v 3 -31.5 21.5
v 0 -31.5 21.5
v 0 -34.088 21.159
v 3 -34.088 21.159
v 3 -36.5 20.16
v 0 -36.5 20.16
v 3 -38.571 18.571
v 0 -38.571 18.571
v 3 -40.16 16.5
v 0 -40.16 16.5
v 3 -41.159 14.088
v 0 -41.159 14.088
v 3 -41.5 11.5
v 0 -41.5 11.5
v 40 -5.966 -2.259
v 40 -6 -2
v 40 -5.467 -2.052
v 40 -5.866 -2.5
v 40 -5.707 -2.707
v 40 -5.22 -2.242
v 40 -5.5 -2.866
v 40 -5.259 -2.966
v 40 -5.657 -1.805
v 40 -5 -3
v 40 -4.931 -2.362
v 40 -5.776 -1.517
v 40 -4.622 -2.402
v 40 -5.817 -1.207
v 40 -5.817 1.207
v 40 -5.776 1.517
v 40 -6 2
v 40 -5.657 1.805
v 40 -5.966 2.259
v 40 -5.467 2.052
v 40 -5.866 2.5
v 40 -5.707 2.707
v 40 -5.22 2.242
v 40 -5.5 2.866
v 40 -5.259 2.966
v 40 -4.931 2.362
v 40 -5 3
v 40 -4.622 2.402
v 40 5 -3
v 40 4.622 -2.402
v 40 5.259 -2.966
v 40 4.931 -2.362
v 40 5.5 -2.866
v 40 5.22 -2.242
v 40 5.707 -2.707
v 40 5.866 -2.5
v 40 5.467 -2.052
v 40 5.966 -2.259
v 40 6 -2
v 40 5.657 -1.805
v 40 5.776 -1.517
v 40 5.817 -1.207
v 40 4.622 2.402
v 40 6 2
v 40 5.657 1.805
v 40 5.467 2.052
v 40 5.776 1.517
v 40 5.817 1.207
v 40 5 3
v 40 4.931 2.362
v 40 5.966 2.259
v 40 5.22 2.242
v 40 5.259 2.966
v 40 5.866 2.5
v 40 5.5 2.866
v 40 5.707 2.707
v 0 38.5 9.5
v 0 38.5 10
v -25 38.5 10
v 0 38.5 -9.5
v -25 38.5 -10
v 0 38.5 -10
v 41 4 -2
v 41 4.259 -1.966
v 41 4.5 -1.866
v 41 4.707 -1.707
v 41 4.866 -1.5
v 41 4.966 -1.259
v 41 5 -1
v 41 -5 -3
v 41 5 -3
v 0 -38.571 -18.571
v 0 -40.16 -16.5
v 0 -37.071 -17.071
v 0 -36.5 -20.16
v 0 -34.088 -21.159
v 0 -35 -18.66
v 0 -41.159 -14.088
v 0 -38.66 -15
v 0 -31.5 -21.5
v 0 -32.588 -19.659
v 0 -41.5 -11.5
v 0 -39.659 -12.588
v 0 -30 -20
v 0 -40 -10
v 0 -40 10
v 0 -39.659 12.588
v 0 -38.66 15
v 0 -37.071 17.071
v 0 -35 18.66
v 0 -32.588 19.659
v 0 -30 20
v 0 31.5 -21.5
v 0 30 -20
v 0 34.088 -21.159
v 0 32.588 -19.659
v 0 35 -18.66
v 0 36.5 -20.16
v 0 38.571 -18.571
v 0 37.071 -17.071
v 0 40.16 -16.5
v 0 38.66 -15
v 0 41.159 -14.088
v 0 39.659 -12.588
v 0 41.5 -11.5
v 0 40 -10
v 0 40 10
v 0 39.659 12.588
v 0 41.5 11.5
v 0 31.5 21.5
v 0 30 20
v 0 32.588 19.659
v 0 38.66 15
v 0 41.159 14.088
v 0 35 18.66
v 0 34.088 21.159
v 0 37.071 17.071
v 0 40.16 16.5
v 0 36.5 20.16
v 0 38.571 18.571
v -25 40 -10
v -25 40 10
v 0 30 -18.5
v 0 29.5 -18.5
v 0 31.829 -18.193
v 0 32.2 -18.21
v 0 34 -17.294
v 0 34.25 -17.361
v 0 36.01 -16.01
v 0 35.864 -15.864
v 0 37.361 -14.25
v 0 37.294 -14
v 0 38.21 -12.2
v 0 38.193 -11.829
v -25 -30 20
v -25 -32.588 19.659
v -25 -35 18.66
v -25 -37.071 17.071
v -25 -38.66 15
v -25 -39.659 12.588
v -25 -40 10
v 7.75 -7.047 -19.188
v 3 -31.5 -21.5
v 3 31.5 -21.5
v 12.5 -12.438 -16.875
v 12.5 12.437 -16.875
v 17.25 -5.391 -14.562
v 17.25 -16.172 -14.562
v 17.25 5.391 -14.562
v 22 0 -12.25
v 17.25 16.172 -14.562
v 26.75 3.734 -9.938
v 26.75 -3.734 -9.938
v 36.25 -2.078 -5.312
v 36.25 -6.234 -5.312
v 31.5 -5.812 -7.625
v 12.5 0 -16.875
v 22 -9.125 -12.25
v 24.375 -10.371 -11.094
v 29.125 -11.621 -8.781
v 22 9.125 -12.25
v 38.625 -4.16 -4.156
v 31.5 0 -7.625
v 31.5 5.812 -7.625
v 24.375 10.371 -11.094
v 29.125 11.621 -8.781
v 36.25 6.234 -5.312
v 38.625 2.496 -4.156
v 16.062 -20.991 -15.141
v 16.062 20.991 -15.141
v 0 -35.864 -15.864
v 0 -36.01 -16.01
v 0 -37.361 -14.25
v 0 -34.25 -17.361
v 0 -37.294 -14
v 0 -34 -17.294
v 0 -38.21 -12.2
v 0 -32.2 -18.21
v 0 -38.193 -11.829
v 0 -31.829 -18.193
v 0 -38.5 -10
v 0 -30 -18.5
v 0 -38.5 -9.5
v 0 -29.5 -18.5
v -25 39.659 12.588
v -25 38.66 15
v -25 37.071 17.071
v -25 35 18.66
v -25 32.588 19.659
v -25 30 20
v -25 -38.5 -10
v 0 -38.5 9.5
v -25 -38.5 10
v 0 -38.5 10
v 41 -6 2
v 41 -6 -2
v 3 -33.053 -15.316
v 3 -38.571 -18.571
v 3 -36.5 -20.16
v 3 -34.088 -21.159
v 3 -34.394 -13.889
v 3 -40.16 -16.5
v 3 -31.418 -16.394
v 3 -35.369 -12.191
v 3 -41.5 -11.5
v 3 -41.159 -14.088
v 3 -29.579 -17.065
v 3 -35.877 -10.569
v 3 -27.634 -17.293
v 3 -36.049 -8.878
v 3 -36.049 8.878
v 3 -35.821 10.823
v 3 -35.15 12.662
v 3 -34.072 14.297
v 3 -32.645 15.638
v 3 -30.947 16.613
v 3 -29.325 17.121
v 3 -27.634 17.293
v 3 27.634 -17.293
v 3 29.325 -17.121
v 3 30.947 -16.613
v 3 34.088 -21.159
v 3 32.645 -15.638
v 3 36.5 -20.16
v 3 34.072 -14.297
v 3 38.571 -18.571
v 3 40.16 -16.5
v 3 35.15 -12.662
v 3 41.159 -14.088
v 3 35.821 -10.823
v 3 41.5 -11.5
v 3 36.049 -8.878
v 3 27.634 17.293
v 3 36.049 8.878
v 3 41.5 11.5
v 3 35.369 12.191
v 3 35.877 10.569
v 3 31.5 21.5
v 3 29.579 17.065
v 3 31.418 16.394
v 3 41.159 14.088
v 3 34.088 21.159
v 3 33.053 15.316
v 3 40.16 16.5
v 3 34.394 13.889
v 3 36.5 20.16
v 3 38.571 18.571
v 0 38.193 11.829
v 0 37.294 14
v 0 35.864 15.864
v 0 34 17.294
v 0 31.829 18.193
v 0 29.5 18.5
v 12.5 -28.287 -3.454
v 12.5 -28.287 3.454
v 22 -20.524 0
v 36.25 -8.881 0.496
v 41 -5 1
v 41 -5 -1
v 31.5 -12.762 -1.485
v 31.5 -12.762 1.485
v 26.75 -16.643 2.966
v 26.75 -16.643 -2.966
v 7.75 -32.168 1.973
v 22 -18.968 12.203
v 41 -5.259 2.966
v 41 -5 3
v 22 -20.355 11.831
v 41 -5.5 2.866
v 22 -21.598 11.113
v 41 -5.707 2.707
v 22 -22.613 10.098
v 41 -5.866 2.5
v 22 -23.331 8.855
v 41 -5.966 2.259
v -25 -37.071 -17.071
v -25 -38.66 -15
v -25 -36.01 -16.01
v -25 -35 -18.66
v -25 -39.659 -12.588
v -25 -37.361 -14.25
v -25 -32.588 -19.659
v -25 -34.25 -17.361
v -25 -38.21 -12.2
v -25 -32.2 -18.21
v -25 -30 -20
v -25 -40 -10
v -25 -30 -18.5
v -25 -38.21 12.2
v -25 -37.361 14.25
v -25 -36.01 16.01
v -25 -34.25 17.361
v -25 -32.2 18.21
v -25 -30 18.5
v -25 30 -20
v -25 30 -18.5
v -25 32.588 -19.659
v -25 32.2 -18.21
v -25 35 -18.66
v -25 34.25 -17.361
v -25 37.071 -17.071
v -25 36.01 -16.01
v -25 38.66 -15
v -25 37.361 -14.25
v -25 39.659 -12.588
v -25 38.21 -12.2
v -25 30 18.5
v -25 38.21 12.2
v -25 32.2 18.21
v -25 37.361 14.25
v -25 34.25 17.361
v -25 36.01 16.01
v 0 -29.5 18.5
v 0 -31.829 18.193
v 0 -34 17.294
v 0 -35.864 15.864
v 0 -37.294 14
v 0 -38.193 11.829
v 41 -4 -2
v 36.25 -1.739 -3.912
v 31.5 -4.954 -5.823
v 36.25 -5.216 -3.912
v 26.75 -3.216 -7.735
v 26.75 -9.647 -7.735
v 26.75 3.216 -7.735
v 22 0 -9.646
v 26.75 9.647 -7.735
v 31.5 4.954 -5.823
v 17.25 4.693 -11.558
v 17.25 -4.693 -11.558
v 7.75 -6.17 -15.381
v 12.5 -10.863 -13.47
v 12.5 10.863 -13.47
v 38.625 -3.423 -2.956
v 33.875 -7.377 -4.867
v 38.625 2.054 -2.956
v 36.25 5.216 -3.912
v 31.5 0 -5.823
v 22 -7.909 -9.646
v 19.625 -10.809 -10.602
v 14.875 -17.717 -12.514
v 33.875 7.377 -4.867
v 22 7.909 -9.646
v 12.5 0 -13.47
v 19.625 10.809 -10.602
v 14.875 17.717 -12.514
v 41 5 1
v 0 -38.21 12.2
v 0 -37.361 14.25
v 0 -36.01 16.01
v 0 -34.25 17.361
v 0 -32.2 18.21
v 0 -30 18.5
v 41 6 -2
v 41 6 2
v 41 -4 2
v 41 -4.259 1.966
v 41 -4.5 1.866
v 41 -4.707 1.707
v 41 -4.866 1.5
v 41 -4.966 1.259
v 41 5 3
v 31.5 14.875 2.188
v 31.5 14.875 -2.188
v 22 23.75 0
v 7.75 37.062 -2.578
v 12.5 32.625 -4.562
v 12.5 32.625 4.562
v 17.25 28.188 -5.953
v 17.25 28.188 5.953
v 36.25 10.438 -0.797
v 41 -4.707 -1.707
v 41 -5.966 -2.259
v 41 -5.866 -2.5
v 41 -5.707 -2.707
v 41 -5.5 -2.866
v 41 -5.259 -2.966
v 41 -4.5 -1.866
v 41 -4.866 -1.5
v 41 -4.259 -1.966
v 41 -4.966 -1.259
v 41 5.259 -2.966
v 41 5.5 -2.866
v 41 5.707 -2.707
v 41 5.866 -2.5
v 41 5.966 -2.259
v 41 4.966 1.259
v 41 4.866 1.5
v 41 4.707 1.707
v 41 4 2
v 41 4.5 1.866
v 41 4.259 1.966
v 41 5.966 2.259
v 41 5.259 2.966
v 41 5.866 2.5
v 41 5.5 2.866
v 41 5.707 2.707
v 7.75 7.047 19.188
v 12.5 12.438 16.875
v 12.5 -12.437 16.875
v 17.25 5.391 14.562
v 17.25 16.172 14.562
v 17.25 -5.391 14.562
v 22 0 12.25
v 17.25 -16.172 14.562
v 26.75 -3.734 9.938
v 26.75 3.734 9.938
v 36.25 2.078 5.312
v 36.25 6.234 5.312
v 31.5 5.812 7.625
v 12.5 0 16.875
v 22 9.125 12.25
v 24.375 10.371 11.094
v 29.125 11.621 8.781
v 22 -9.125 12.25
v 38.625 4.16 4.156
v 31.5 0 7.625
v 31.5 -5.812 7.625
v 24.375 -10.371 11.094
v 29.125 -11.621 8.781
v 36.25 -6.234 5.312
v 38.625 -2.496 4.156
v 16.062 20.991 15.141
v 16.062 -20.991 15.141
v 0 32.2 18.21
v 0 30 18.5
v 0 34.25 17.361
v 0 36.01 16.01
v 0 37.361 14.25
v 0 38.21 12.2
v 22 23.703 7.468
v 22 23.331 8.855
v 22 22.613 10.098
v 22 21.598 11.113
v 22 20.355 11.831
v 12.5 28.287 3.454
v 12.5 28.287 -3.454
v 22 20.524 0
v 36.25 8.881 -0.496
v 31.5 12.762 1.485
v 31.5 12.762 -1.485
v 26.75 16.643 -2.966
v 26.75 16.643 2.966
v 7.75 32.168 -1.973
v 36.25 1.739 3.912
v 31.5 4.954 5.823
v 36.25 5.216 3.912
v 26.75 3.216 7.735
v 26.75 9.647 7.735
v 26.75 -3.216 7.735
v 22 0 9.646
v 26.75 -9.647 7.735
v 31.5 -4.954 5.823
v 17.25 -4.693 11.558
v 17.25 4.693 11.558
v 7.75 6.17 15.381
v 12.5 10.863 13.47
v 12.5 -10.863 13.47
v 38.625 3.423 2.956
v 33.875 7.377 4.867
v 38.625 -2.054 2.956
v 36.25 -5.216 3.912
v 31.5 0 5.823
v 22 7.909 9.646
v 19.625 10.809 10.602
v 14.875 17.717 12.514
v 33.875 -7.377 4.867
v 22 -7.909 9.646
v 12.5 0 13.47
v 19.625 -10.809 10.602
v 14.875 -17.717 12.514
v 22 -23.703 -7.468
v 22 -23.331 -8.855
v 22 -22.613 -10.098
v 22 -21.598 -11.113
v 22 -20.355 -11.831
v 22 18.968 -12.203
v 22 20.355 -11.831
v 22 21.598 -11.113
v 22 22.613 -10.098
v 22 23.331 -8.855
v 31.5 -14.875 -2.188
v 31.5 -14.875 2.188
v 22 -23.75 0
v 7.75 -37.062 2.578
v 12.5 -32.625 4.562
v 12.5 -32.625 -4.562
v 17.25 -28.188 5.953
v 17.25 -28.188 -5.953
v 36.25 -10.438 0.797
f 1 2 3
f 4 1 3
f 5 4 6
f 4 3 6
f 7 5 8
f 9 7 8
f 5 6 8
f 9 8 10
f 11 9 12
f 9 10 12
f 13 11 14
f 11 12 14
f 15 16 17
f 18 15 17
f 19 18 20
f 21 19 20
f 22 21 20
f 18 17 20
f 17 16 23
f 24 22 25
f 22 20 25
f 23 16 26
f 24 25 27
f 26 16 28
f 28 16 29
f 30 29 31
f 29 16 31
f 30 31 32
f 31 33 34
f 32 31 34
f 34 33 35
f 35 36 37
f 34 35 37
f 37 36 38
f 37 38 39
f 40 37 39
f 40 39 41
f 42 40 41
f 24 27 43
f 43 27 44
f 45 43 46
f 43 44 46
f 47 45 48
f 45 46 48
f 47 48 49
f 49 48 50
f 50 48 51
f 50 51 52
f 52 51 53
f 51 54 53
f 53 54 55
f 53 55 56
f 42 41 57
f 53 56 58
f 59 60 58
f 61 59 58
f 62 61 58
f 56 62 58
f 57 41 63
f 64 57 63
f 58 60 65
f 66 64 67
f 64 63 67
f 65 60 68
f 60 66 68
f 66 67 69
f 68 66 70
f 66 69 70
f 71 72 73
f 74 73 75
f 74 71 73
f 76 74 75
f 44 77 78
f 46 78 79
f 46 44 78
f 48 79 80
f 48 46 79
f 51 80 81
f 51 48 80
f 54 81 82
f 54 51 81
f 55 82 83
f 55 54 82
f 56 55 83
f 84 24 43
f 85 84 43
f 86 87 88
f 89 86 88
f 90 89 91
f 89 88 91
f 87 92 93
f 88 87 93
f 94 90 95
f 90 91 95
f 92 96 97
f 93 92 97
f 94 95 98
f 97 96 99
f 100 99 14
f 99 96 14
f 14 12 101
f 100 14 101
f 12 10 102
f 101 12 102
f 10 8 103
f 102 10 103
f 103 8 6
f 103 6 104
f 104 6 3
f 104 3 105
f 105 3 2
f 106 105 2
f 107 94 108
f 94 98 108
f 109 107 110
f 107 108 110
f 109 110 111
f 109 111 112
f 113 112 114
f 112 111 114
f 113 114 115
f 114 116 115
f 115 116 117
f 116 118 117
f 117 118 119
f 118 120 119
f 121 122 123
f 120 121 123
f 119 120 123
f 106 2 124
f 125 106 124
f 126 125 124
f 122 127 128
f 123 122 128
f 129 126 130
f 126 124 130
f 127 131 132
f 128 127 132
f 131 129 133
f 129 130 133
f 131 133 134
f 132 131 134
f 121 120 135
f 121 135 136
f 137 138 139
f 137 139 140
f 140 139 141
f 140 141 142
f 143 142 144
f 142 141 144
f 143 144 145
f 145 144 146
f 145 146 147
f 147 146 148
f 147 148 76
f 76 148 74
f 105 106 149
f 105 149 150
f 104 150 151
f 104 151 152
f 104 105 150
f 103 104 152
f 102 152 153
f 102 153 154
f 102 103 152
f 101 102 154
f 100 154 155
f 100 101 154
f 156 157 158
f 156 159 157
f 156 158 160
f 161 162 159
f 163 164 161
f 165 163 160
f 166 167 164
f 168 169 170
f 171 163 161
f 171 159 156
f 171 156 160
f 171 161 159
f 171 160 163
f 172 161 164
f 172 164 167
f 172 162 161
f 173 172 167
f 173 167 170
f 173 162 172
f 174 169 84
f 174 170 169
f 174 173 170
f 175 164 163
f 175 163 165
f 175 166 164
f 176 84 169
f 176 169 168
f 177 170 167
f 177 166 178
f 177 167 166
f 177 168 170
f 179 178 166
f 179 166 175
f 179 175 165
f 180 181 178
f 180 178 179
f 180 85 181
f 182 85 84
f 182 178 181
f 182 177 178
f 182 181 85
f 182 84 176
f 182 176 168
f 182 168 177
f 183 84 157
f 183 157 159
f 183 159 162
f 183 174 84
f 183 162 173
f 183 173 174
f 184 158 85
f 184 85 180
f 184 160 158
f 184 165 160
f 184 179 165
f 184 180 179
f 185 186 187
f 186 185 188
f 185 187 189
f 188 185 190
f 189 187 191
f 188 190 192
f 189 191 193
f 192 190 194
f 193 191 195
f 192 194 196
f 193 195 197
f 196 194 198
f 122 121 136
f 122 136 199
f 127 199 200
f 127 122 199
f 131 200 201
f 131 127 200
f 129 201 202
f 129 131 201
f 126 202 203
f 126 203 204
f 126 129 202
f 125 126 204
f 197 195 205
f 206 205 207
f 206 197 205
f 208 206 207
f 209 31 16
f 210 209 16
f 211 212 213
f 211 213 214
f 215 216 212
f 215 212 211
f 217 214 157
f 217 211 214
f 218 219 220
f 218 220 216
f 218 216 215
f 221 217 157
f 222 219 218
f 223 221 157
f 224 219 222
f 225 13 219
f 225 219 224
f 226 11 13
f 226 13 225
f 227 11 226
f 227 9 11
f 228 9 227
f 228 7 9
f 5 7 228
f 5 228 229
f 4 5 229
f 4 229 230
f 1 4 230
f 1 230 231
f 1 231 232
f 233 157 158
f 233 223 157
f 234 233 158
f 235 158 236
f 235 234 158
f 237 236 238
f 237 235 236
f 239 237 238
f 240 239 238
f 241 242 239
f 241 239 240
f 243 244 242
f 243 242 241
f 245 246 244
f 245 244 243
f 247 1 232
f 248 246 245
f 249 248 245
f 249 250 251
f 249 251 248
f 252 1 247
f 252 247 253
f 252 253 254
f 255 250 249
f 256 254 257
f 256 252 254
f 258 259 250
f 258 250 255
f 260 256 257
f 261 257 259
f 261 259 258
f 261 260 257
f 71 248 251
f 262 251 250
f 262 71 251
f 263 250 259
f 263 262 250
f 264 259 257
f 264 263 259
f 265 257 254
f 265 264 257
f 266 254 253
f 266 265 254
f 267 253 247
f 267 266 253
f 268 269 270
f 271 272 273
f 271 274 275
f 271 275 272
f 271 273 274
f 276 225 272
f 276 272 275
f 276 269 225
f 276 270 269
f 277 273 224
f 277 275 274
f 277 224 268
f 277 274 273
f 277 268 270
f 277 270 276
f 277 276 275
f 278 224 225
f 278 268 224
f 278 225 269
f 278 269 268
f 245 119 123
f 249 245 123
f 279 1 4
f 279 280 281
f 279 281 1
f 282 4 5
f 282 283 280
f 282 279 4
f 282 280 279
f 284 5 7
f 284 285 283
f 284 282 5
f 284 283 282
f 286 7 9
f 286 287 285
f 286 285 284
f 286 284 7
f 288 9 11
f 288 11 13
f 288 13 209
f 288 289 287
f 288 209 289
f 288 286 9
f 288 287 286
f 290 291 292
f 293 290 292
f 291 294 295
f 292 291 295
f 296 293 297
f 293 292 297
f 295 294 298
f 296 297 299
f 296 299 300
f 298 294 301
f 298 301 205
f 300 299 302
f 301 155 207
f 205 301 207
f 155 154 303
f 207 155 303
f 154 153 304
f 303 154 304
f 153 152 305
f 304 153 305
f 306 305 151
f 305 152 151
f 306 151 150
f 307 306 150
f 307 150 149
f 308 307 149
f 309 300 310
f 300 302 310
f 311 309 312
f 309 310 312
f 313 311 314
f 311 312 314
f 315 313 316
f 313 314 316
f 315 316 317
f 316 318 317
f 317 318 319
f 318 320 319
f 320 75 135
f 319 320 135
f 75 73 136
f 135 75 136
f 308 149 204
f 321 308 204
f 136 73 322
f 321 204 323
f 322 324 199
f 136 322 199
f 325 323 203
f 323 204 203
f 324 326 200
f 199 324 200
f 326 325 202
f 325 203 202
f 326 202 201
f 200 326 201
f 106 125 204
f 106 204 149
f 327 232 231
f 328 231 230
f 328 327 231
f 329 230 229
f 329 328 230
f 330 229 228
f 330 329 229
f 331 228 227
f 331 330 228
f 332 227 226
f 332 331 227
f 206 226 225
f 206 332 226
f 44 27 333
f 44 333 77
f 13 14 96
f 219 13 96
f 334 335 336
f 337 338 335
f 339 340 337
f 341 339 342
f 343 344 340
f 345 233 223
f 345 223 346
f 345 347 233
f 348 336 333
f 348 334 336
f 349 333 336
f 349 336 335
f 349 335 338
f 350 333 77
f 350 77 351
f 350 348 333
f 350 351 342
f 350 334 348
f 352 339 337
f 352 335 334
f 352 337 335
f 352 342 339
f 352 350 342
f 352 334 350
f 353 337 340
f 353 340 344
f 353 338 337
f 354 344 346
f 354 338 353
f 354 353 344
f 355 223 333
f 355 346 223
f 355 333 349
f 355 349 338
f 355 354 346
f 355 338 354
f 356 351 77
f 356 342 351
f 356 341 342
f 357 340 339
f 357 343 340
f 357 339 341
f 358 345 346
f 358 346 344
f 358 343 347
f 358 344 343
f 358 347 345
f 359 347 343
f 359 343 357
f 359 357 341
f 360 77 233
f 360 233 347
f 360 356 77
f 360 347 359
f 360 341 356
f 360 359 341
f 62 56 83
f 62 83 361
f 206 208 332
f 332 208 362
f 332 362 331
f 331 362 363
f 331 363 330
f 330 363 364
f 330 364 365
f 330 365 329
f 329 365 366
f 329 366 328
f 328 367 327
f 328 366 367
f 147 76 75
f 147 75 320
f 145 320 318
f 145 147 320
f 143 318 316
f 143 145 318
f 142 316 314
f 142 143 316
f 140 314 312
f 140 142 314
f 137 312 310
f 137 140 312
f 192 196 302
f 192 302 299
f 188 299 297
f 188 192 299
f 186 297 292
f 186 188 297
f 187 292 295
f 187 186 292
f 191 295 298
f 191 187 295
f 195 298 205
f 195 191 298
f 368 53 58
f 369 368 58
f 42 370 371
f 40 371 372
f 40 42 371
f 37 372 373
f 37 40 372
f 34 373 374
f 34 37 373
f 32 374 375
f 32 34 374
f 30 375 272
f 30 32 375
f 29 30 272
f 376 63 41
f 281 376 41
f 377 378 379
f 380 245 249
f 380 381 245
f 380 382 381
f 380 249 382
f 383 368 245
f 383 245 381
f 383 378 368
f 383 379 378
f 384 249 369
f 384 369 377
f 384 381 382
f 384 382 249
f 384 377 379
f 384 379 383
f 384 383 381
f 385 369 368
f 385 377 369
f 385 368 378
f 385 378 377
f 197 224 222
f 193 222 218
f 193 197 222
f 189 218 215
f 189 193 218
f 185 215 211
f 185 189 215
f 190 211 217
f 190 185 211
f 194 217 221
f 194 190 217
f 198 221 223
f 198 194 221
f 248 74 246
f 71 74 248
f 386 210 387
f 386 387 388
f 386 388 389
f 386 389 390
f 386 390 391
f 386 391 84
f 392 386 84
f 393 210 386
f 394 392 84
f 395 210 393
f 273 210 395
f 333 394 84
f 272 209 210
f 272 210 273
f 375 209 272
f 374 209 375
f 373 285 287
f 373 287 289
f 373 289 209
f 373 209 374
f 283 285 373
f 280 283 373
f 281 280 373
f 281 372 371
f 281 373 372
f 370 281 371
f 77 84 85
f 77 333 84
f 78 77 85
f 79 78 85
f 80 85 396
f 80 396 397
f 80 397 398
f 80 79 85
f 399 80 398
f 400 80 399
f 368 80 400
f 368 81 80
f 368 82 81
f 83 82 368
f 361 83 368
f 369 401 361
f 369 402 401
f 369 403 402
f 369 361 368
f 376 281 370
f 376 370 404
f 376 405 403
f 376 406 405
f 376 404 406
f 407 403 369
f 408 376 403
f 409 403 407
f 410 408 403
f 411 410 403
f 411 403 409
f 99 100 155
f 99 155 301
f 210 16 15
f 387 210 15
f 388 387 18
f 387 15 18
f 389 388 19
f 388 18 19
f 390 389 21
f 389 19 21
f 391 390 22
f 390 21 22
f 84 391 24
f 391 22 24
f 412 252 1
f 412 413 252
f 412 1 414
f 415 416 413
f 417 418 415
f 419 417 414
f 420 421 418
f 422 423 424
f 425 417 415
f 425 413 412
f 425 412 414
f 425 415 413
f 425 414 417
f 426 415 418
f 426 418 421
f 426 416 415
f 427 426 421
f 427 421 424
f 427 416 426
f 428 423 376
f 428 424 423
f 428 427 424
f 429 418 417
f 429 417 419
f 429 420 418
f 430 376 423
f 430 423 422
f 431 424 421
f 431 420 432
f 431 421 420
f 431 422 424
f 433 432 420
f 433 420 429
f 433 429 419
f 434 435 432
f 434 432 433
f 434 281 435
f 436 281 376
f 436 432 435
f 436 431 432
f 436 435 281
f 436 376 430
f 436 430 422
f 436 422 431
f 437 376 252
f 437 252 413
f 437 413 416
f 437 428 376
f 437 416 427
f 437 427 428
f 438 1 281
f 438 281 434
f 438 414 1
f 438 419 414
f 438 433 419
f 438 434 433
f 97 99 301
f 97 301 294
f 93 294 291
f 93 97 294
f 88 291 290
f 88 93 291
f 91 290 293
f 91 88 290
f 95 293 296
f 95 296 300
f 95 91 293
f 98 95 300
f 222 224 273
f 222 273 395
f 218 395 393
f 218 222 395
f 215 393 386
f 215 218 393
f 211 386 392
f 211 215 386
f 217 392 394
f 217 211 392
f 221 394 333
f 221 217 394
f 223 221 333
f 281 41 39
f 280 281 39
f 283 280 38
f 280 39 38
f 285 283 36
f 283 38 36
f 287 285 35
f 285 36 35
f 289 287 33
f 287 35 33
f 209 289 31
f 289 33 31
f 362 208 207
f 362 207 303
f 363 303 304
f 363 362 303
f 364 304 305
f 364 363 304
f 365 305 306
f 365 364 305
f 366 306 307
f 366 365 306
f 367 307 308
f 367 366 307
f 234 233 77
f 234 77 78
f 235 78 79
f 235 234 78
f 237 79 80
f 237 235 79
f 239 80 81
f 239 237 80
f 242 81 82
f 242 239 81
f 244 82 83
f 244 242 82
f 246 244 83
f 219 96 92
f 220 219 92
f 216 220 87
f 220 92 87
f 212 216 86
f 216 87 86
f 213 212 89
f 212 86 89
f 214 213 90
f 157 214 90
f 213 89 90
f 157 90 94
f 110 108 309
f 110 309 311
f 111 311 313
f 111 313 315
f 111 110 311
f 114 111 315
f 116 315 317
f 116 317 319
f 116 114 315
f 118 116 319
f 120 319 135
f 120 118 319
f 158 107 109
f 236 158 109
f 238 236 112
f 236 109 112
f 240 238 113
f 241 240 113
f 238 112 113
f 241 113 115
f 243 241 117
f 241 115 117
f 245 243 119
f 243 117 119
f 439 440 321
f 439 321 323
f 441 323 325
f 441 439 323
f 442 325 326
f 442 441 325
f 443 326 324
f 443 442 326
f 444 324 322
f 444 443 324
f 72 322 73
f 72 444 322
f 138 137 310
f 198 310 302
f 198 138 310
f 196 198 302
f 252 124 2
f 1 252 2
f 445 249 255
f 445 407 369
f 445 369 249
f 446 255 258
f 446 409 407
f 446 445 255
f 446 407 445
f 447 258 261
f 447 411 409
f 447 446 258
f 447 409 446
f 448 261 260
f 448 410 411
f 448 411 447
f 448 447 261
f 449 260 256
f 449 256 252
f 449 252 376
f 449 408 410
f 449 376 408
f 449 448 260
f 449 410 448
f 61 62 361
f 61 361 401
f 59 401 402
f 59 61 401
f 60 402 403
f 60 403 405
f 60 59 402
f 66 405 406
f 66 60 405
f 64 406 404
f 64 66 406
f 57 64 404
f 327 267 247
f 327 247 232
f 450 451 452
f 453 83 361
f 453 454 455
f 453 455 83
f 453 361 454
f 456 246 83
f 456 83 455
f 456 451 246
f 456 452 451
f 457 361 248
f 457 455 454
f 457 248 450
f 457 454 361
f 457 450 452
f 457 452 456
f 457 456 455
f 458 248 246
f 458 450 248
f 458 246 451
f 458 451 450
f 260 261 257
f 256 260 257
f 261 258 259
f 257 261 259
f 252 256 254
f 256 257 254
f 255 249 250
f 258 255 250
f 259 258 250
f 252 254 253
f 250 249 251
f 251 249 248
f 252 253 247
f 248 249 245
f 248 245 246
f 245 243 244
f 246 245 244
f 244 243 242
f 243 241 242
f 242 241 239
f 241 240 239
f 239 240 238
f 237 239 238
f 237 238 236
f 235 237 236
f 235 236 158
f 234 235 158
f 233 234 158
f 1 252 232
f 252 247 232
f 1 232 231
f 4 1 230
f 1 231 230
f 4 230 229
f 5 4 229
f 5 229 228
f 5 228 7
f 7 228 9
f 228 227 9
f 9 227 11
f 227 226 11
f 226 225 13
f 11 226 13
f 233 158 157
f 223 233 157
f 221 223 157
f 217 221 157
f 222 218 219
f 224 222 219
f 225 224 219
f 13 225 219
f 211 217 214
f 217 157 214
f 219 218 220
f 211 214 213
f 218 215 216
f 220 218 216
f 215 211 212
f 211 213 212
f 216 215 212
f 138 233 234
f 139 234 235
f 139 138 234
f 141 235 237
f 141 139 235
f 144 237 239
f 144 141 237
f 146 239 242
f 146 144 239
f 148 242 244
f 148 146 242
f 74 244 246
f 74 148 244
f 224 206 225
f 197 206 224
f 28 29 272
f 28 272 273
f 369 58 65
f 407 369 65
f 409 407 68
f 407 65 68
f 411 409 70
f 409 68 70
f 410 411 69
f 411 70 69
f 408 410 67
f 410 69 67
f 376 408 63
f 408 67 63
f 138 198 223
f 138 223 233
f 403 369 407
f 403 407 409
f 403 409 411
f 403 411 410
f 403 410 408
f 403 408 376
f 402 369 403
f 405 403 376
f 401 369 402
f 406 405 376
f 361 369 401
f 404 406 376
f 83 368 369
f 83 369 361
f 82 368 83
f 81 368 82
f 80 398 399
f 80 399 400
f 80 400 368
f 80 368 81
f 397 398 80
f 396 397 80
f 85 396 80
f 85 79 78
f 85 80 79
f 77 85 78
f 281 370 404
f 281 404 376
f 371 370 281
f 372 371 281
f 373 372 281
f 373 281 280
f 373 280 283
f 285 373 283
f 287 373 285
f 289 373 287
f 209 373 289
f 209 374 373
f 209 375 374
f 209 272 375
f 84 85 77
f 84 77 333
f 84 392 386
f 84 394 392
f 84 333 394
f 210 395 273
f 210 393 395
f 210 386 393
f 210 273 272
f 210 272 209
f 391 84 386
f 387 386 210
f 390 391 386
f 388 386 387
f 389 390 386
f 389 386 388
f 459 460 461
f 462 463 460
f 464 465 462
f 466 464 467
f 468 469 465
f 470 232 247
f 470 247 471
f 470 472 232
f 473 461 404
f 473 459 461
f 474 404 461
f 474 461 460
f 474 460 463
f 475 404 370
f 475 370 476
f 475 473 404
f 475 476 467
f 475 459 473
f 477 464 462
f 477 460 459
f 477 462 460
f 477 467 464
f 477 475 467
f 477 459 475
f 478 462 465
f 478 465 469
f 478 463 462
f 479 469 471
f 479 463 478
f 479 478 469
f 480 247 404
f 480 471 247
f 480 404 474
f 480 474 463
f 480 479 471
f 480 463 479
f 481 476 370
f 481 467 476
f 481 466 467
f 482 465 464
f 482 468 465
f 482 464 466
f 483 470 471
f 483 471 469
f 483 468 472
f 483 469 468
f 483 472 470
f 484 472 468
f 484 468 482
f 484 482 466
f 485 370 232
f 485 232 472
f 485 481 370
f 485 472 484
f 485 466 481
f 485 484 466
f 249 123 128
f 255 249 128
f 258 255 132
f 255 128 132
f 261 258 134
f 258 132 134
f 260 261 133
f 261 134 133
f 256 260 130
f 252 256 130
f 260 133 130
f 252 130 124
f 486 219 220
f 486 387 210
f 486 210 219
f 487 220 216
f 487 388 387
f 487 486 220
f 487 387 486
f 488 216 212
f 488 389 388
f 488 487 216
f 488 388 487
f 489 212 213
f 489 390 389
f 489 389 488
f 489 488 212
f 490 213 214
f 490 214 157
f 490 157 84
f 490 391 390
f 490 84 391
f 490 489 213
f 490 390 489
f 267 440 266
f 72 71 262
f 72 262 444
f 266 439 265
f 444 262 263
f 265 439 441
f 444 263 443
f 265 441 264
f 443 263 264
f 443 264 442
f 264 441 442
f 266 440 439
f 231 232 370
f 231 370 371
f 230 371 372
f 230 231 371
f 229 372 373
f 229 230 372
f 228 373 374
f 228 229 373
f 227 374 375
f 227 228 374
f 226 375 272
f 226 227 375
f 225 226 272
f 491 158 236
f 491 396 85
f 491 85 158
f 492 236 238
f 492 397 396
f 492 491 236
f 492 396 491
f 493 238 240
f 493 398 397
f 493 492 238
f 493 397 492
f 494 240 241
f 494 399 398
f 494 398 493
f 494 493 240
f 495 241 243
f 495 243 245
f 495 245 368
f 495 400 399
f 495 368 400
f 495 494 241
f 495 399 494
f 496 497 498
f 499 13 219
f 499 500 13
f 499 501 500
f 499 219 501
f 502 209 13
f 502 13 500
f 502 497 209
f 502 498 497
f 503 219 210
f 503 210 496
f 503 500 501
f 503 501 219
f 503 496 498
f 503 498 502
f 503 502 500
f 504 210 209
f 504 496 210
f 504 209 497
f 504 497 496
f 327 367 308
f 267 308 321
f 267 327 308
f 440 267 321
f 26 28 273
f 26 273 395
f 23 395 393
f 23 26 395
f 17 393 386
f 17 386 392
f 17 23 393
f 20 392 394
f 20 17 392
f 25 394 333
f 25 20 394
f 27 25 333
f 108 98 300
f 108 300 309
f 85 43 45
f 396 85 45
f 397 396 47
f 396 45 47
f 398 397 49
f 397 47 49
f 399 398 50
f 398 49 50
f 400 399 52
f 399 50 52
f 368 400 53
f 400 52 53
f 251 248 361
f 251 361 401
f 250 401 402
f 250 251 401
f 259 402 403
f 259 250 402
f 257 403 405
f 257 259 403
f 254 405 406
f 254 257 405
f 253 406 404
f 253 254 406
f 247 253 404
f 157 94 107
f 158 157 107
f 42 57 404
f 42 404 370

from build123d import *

# Parameters (mm, degrees)
F1_DEPTH = 25
F4_DEPTH = 3
F6_DEPTH = 1


with BuildPart() as f1:
    # F0 (on Right) → F1 (new body)
    with BuildSketch(Plane.YZ):
        with BuildLine():
            Line((30, 20), (-30, 20))
            ThreePointArc((-30, 20), (-37.071068, 17.071068), (-40, 10))
            Line((-40, 10), (-40, -10))
            ThreePointArc((-40, -10), (-37.071068, -17.071068), (-30, -20))
            Line((-30, -20), (30, -20))
            ThreePointArc((30, -20), (37.071068, -17.071068), (40, -10))
            Line((40, -10), (40, 10))
            ThreePointArc((40, 10), (37.071068, 17.071068), (30, 20))
        make_face()
        with BuildLine():
            ThreePointArc((30, 18.5), (36.010408, 16.010408), (38.5, 10))
            Line((38.5, 10), (38.5, -10))
            ThreePointArc((38.5, -10), (36.010408, -16.010408), (30, -18.5))
            Line((30, -18.5), (-30, -18.5))
            ThreePointArc((-30, -18.5), (-36.010408, -16.010408), (-38.5, -10))
            Line((-38.5, -10), (-38.5, 10))
            ThreePointArc((-38.5, 10), (-36.010408, 16.010408), (-30, 18.5))
            Line((-30, 18.5), (30, 18.5))
        make_face(mode=Mode.SUBTRACT)
    extrude(amount=-F1_DEPTH)

    # F3 (on Right) → F4 (join)
    with BuildSketch(Plane.YZ):
        with BuildLine():
            ThreePointArc((-41.5, -11.5), (-38.571068, -18.571068), (-31.5, -21.5))
            Line((-31.5, -21.5), (31.5, -21.5))
            ThreePointArc((31.5, -21.5), (38.571068, -18.571068), (41.5, -11.5))
            Line((41.5, -11.5), (41.5, 11.5))
            ThreePointArc((41.5, 11.5), (38.571068, 18.571068), (31.5, 21.5))
            Line((31.5, 21.5), (-31.5, 21.5))
            ThreePointArc((-31.5, 21.5), (-38.571068, 18.571068), (-41.5, 11.5))
            Line((-41.5, 11.5), (-41.5, -11.5))
        make_face()
    extrude(amount=F4_DEPTH)


with BuildPart() as f6:
    # F5 (on offset) → F6 (new body)
    with BuildSketch(Plane.YZ.offset(40)):
        with BuildLine():
            Line((-5, -3), (5, -3))
            ThreePointArc((5, -3), (5.707107, -2.707107), (6, -2))
            Line((6, -2), (6, 2))
            ThreePointArc((6, 2), (5.707107, 2.707107), (5, 3))
            Line((5, 3), (-5, 3))
            ThreePointArc((-5, 3), (-5.707107, 2.707107), (-6, 2))
            Line((-6, 2), (-6, -2))
            ThreePointArc((-6, -2), (-5.707107, -2.707107), (-5, -3))
        make_face()
    extrude(amount=F6_DEPTH)


with BuildPart() as f7:
    # F4_face (on face) → F7 section 0
    with BuildSketch(Plane.YZ.offset(3)):
        with BuildLine():
            ThreePointArc((-41.5, -11.5), (-38.571068, -18.571068), (-31.5, -21.5))
            Line((-31.5, -21.5), (31.5, -21.5))
            ThreePointArc((31.5, -21.5), (38.571068, -18.571068), (41.5, -11.5))
            Line((41.5, -11.5), (41.5, 11.5))
            ThreePointArc((41.5, 11.5), (38.571068, 18.571068), (31.5, 21.5))
            Line((31.5, 21.5), (-31.5, 21.5))
            ThreePointArc((-31.5, 21.5), (-38.571068, 18.571068), (-41.5, 11.5))
            Line((-41.5, 11.5), (-41.5, -11.5))
        make_face()
    # F6_face (on face) → F7 section 1
    with BuildSketch(Plane.YZ.offset(41)):
        with BuildLine():
            Line((-5, -3), (5, -3))
            ThreePointArc((5, -3), (5.707107, -2.707107), (6, -2))
            Line((6, -2), (6, 2))
            ThreePointArc((6, 2), (5.707107, 2.707107), (5, 3))
            Line((5, 3), (-5, 3))
            ThreePointArc((-5, 3), (-5.707107, 2.707107), (-6, 2))
            Line((-6, 2), (-6, -2))
            ThreePointArc((-6, -2), (-5.707107, -2.707107), (-5, -3))
        make_face()
    loft()


with BuildPart() as f10_tool:
    # F8 (on face) → F10 section 0
    with BuildSketch(Plane.YZ.offset(41)):
        with BuildLine():
            Line((-4, -2), (4, -2))
            ThreePointArc((4, -2), (4.707107, -1.707107), (5, -1))
            Line((5, -1), (5, 1))
            ThreePointArc((5, 1), (4.707107, 1.707107), (4, 2))
            Line((4, 2), (-4, 2))
            ThreePointArc((-4, 2), (-4.707107, 1.707107), (-5, 1))
            Line((-5, 1), (-5, -1))
            ThreePointArc((-5, -1), (-4.707107, -1.707107), (-4, -2))
        make_face()
    # F9 (on Right) → F10 section 1
    with BuildSketch(Plane.YZ):
        with BuildLine():
            ThreePointArc((-38.5, -9.5), (-35.863961, -15.863961), (-29.5, -18.5))
            Line((-29.5, -18.5), (29.5, -18.5))
            ThreePointArc((29.5, -18.5), (35.863961, -15.863961), (38.5, -9.5))
            Line((38.5, -9.5), (38.5, 9.5))
            ThreePointArc((38.5, 9.5), (35.863961, 15.863961), (29.5, 18.5))
            Line((29.5, 18.5), (-29.5, 18.5))
            ThreePointArc((-29.5, 18.5), (-35.863961, 15.863961), (-38.5, 9.5))
            Line((-38.5, 9.5), (-38.5, -9.5))
        make_face()
    loft()


with BuildPart() as f1_1:
    add(f1.part)

    # F10: cut by f10_tool
    add(f10_tool.part, mode=Mode.SUBTRACT)


with BuildPart() as f6_1:
    add(f6.part)

    # F10: cut by f10_tool
    add(f10_tool.part, mode=Mode.SUBTRACT)


with BuildPart() as f7_1:
    add(f7.part)

    # F10: cut by f10_tool
    add(f10_tool.part, mode=Mode.SUBTRACT)


solid = Compound([f1_1.part, f6_1.part, f7_1.part])
